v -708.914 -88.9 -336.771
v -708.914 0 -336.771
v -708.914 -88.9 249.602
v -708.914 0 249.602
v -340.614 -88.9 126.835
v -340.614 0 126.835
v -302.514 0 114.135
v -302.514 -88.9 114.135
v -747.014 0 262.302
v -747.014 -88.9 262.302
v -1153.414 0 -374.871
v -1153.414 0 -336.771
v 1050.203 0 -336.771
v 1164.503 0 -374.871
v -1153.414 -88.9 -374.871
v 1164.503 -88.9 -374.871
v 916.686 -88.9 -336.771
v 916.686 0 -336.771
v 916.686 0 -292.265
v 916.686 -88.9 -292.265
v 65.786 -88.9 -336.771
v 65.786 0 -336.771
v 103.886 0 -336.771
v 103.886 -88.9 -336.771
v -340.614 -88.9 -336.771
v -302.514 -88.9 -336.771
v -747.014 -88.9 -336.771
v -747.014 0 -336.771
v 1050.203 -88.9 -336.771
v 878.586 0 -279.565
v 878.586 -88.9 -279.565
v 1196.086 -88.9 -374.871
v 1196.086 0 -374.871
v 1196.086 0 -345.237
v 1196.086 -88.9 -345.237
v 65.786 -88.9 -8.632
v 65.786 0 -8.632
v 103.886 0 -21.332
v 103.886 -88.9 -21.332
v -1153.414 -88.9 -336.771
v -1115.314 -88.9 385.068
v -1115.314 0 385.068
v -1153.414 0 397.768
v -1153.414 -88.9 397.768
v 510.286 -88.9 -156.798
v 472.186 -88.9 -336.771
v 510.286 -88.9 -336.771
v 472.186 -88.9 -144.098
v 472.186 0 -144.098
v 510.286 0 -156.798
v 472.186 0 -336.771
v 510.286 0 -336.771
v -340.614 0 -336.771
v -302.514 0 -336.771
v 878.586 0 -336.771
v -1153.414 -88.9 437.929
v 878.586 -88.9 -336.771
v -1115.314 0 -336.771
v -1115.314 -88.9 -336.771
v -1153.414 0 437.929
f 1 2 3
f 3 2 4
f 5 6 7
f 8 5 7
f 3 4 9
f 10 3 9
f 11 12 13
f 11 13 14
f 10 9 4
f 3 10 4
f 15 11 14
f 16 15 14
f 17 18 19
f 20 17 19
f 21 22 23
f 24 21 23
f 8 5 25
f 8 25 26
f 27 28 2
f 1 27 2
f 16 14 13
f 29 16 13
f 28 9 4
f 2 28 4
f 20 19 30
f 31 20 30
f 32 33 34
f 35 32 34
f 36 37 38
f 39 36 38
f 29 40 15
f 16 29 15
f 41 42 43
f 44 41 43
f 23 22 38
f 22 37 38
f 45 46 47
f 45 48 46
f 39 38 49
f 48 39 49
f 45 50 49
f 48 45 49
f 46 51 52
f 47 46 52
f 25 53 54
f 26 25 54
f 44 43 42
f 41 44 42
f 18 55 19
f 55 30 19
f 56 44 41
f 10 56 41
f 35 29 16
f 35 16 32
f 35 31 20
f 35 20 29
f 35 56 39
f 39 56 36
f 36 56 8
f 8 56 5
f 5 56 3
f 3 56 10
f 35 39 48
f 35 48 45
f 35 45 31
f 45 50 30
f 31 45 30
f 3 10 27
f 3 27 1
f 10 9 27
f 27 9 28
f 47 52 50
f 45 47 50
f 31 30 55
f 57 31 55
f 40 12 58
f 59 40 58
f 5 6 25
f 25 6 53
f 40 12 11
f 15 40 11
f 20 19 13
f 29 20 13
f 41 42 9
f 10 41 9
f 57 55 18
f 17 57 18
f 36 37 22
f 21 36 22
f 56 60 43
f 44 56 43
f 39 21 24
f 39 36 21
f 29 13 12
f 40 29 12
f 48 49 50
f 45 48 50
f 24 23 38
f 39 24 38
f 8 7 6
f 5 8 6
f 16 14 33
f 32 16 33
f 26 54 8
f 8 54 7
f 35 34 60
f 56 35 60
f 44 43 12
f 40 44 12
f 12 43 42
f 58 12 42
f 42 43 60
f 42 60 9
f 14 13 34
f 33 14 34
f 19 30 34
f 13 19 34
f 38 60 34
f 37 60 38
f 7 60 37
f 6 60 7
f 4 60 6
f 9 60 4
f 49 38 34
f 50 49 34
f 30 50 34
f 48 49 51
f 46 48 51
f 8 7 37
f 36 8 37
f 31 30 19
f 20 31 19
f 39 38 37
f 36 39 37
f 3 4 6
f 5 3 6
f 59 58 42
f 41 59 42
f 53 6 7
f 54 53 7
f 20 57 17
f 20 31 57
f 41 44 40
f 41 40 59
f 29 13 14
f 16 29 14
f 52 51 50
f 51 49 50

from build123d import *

# Parameters (mm, degrees)
F1_DEPTH = 88.9
F2_DEPTH = 88.9
F3_DEPTH = 88.9


with BuildPart() as f1:
    # F0 (on Front) → F1 (new body)
    with BuildSketch(Plane.XZ):
        Polygon((-1153.414262, 397.768276), (-1153.414262, -336.770798), (-1115.314262, -336.770798), (-1115.314262, 385.068276), align=None)
        Polygon((-747.014262, 262.301609), (-747.014262, -336.770798), (-708.914262, -336.770798), (-708.914262, 249.601609), align=None)
        Polygon((-340.614262, 126.834942), (-340.614262, -336.770798), (-302.514262, -336.770798), (-302.514262, 114.134942), align=None)
        Polygon((65.785738, -336.770798), (103.885738, -336.770798), (103.885738, -21.331724), (65.785738, -8.631724), align=None)
        Polygon((472.185738, -336.770798), (510.285738, -336.770798), (510.285738, -156.798391), (472.185738, -144.098391), align=None)
        Polygon((878.585738, -336.770798), (916.685738, -336.770798), (916.685738, -292.265058), (878.585738, -279.565058), align=None)
    extrude(amount=F1_DEPTH)


with BuildPart() as f2:
    # F0 (on Front) → F2 (new body)
    with BuildSketch(Plane.XZ):
        Polygon((1050.20296, -336.770798), (1164.50296, -374.870798), (1196.085738, -374.870798), (1196.085738, -345.237465), (-1153.414262, 437.929202), (-1153.414262, 397.768276), (-1115.314262, 385.068276), (-747.014262, 262.301609), (-708.914262, 249.601609), (-340.614262, 126.834942), (-302.514262, 114.134942), (65.785738, -8.631724), (103.885738, -21.331724), (472.185738, -144.098391), (510.285738, -156.798391), (878.585738, -279.565058), (916.685738, -292.265058), align=None)
    extrude(amount=F2_DEPTH)


with BuildPart() as f3:
    # F0 (on Front) → F3 (new body)
    with BuildSketch(Plane.XZ):
        Polygon((-1153.414262, -336.770798), (-1153.414262, -374.870798), (1164.50296, -374.870798), (1050.20296, -336.770798), (916.685738, -336.770798), (878.585738, -336.770798), (510.285738, -336.770798), (472.185738, -336.770798), (103.885738, -336.770798), (65.785738, -336.770798), (-302.514262, -336.770798), (-340.614262, -336.770798), (-708.914262, -336.770798), (-747.014262, -336.770798), (-1115.314262, -336.770798), align=None)
    extrude(amount=F3_DEPTH)


solid = Compound([f1.part, f2.part, f3.part])
